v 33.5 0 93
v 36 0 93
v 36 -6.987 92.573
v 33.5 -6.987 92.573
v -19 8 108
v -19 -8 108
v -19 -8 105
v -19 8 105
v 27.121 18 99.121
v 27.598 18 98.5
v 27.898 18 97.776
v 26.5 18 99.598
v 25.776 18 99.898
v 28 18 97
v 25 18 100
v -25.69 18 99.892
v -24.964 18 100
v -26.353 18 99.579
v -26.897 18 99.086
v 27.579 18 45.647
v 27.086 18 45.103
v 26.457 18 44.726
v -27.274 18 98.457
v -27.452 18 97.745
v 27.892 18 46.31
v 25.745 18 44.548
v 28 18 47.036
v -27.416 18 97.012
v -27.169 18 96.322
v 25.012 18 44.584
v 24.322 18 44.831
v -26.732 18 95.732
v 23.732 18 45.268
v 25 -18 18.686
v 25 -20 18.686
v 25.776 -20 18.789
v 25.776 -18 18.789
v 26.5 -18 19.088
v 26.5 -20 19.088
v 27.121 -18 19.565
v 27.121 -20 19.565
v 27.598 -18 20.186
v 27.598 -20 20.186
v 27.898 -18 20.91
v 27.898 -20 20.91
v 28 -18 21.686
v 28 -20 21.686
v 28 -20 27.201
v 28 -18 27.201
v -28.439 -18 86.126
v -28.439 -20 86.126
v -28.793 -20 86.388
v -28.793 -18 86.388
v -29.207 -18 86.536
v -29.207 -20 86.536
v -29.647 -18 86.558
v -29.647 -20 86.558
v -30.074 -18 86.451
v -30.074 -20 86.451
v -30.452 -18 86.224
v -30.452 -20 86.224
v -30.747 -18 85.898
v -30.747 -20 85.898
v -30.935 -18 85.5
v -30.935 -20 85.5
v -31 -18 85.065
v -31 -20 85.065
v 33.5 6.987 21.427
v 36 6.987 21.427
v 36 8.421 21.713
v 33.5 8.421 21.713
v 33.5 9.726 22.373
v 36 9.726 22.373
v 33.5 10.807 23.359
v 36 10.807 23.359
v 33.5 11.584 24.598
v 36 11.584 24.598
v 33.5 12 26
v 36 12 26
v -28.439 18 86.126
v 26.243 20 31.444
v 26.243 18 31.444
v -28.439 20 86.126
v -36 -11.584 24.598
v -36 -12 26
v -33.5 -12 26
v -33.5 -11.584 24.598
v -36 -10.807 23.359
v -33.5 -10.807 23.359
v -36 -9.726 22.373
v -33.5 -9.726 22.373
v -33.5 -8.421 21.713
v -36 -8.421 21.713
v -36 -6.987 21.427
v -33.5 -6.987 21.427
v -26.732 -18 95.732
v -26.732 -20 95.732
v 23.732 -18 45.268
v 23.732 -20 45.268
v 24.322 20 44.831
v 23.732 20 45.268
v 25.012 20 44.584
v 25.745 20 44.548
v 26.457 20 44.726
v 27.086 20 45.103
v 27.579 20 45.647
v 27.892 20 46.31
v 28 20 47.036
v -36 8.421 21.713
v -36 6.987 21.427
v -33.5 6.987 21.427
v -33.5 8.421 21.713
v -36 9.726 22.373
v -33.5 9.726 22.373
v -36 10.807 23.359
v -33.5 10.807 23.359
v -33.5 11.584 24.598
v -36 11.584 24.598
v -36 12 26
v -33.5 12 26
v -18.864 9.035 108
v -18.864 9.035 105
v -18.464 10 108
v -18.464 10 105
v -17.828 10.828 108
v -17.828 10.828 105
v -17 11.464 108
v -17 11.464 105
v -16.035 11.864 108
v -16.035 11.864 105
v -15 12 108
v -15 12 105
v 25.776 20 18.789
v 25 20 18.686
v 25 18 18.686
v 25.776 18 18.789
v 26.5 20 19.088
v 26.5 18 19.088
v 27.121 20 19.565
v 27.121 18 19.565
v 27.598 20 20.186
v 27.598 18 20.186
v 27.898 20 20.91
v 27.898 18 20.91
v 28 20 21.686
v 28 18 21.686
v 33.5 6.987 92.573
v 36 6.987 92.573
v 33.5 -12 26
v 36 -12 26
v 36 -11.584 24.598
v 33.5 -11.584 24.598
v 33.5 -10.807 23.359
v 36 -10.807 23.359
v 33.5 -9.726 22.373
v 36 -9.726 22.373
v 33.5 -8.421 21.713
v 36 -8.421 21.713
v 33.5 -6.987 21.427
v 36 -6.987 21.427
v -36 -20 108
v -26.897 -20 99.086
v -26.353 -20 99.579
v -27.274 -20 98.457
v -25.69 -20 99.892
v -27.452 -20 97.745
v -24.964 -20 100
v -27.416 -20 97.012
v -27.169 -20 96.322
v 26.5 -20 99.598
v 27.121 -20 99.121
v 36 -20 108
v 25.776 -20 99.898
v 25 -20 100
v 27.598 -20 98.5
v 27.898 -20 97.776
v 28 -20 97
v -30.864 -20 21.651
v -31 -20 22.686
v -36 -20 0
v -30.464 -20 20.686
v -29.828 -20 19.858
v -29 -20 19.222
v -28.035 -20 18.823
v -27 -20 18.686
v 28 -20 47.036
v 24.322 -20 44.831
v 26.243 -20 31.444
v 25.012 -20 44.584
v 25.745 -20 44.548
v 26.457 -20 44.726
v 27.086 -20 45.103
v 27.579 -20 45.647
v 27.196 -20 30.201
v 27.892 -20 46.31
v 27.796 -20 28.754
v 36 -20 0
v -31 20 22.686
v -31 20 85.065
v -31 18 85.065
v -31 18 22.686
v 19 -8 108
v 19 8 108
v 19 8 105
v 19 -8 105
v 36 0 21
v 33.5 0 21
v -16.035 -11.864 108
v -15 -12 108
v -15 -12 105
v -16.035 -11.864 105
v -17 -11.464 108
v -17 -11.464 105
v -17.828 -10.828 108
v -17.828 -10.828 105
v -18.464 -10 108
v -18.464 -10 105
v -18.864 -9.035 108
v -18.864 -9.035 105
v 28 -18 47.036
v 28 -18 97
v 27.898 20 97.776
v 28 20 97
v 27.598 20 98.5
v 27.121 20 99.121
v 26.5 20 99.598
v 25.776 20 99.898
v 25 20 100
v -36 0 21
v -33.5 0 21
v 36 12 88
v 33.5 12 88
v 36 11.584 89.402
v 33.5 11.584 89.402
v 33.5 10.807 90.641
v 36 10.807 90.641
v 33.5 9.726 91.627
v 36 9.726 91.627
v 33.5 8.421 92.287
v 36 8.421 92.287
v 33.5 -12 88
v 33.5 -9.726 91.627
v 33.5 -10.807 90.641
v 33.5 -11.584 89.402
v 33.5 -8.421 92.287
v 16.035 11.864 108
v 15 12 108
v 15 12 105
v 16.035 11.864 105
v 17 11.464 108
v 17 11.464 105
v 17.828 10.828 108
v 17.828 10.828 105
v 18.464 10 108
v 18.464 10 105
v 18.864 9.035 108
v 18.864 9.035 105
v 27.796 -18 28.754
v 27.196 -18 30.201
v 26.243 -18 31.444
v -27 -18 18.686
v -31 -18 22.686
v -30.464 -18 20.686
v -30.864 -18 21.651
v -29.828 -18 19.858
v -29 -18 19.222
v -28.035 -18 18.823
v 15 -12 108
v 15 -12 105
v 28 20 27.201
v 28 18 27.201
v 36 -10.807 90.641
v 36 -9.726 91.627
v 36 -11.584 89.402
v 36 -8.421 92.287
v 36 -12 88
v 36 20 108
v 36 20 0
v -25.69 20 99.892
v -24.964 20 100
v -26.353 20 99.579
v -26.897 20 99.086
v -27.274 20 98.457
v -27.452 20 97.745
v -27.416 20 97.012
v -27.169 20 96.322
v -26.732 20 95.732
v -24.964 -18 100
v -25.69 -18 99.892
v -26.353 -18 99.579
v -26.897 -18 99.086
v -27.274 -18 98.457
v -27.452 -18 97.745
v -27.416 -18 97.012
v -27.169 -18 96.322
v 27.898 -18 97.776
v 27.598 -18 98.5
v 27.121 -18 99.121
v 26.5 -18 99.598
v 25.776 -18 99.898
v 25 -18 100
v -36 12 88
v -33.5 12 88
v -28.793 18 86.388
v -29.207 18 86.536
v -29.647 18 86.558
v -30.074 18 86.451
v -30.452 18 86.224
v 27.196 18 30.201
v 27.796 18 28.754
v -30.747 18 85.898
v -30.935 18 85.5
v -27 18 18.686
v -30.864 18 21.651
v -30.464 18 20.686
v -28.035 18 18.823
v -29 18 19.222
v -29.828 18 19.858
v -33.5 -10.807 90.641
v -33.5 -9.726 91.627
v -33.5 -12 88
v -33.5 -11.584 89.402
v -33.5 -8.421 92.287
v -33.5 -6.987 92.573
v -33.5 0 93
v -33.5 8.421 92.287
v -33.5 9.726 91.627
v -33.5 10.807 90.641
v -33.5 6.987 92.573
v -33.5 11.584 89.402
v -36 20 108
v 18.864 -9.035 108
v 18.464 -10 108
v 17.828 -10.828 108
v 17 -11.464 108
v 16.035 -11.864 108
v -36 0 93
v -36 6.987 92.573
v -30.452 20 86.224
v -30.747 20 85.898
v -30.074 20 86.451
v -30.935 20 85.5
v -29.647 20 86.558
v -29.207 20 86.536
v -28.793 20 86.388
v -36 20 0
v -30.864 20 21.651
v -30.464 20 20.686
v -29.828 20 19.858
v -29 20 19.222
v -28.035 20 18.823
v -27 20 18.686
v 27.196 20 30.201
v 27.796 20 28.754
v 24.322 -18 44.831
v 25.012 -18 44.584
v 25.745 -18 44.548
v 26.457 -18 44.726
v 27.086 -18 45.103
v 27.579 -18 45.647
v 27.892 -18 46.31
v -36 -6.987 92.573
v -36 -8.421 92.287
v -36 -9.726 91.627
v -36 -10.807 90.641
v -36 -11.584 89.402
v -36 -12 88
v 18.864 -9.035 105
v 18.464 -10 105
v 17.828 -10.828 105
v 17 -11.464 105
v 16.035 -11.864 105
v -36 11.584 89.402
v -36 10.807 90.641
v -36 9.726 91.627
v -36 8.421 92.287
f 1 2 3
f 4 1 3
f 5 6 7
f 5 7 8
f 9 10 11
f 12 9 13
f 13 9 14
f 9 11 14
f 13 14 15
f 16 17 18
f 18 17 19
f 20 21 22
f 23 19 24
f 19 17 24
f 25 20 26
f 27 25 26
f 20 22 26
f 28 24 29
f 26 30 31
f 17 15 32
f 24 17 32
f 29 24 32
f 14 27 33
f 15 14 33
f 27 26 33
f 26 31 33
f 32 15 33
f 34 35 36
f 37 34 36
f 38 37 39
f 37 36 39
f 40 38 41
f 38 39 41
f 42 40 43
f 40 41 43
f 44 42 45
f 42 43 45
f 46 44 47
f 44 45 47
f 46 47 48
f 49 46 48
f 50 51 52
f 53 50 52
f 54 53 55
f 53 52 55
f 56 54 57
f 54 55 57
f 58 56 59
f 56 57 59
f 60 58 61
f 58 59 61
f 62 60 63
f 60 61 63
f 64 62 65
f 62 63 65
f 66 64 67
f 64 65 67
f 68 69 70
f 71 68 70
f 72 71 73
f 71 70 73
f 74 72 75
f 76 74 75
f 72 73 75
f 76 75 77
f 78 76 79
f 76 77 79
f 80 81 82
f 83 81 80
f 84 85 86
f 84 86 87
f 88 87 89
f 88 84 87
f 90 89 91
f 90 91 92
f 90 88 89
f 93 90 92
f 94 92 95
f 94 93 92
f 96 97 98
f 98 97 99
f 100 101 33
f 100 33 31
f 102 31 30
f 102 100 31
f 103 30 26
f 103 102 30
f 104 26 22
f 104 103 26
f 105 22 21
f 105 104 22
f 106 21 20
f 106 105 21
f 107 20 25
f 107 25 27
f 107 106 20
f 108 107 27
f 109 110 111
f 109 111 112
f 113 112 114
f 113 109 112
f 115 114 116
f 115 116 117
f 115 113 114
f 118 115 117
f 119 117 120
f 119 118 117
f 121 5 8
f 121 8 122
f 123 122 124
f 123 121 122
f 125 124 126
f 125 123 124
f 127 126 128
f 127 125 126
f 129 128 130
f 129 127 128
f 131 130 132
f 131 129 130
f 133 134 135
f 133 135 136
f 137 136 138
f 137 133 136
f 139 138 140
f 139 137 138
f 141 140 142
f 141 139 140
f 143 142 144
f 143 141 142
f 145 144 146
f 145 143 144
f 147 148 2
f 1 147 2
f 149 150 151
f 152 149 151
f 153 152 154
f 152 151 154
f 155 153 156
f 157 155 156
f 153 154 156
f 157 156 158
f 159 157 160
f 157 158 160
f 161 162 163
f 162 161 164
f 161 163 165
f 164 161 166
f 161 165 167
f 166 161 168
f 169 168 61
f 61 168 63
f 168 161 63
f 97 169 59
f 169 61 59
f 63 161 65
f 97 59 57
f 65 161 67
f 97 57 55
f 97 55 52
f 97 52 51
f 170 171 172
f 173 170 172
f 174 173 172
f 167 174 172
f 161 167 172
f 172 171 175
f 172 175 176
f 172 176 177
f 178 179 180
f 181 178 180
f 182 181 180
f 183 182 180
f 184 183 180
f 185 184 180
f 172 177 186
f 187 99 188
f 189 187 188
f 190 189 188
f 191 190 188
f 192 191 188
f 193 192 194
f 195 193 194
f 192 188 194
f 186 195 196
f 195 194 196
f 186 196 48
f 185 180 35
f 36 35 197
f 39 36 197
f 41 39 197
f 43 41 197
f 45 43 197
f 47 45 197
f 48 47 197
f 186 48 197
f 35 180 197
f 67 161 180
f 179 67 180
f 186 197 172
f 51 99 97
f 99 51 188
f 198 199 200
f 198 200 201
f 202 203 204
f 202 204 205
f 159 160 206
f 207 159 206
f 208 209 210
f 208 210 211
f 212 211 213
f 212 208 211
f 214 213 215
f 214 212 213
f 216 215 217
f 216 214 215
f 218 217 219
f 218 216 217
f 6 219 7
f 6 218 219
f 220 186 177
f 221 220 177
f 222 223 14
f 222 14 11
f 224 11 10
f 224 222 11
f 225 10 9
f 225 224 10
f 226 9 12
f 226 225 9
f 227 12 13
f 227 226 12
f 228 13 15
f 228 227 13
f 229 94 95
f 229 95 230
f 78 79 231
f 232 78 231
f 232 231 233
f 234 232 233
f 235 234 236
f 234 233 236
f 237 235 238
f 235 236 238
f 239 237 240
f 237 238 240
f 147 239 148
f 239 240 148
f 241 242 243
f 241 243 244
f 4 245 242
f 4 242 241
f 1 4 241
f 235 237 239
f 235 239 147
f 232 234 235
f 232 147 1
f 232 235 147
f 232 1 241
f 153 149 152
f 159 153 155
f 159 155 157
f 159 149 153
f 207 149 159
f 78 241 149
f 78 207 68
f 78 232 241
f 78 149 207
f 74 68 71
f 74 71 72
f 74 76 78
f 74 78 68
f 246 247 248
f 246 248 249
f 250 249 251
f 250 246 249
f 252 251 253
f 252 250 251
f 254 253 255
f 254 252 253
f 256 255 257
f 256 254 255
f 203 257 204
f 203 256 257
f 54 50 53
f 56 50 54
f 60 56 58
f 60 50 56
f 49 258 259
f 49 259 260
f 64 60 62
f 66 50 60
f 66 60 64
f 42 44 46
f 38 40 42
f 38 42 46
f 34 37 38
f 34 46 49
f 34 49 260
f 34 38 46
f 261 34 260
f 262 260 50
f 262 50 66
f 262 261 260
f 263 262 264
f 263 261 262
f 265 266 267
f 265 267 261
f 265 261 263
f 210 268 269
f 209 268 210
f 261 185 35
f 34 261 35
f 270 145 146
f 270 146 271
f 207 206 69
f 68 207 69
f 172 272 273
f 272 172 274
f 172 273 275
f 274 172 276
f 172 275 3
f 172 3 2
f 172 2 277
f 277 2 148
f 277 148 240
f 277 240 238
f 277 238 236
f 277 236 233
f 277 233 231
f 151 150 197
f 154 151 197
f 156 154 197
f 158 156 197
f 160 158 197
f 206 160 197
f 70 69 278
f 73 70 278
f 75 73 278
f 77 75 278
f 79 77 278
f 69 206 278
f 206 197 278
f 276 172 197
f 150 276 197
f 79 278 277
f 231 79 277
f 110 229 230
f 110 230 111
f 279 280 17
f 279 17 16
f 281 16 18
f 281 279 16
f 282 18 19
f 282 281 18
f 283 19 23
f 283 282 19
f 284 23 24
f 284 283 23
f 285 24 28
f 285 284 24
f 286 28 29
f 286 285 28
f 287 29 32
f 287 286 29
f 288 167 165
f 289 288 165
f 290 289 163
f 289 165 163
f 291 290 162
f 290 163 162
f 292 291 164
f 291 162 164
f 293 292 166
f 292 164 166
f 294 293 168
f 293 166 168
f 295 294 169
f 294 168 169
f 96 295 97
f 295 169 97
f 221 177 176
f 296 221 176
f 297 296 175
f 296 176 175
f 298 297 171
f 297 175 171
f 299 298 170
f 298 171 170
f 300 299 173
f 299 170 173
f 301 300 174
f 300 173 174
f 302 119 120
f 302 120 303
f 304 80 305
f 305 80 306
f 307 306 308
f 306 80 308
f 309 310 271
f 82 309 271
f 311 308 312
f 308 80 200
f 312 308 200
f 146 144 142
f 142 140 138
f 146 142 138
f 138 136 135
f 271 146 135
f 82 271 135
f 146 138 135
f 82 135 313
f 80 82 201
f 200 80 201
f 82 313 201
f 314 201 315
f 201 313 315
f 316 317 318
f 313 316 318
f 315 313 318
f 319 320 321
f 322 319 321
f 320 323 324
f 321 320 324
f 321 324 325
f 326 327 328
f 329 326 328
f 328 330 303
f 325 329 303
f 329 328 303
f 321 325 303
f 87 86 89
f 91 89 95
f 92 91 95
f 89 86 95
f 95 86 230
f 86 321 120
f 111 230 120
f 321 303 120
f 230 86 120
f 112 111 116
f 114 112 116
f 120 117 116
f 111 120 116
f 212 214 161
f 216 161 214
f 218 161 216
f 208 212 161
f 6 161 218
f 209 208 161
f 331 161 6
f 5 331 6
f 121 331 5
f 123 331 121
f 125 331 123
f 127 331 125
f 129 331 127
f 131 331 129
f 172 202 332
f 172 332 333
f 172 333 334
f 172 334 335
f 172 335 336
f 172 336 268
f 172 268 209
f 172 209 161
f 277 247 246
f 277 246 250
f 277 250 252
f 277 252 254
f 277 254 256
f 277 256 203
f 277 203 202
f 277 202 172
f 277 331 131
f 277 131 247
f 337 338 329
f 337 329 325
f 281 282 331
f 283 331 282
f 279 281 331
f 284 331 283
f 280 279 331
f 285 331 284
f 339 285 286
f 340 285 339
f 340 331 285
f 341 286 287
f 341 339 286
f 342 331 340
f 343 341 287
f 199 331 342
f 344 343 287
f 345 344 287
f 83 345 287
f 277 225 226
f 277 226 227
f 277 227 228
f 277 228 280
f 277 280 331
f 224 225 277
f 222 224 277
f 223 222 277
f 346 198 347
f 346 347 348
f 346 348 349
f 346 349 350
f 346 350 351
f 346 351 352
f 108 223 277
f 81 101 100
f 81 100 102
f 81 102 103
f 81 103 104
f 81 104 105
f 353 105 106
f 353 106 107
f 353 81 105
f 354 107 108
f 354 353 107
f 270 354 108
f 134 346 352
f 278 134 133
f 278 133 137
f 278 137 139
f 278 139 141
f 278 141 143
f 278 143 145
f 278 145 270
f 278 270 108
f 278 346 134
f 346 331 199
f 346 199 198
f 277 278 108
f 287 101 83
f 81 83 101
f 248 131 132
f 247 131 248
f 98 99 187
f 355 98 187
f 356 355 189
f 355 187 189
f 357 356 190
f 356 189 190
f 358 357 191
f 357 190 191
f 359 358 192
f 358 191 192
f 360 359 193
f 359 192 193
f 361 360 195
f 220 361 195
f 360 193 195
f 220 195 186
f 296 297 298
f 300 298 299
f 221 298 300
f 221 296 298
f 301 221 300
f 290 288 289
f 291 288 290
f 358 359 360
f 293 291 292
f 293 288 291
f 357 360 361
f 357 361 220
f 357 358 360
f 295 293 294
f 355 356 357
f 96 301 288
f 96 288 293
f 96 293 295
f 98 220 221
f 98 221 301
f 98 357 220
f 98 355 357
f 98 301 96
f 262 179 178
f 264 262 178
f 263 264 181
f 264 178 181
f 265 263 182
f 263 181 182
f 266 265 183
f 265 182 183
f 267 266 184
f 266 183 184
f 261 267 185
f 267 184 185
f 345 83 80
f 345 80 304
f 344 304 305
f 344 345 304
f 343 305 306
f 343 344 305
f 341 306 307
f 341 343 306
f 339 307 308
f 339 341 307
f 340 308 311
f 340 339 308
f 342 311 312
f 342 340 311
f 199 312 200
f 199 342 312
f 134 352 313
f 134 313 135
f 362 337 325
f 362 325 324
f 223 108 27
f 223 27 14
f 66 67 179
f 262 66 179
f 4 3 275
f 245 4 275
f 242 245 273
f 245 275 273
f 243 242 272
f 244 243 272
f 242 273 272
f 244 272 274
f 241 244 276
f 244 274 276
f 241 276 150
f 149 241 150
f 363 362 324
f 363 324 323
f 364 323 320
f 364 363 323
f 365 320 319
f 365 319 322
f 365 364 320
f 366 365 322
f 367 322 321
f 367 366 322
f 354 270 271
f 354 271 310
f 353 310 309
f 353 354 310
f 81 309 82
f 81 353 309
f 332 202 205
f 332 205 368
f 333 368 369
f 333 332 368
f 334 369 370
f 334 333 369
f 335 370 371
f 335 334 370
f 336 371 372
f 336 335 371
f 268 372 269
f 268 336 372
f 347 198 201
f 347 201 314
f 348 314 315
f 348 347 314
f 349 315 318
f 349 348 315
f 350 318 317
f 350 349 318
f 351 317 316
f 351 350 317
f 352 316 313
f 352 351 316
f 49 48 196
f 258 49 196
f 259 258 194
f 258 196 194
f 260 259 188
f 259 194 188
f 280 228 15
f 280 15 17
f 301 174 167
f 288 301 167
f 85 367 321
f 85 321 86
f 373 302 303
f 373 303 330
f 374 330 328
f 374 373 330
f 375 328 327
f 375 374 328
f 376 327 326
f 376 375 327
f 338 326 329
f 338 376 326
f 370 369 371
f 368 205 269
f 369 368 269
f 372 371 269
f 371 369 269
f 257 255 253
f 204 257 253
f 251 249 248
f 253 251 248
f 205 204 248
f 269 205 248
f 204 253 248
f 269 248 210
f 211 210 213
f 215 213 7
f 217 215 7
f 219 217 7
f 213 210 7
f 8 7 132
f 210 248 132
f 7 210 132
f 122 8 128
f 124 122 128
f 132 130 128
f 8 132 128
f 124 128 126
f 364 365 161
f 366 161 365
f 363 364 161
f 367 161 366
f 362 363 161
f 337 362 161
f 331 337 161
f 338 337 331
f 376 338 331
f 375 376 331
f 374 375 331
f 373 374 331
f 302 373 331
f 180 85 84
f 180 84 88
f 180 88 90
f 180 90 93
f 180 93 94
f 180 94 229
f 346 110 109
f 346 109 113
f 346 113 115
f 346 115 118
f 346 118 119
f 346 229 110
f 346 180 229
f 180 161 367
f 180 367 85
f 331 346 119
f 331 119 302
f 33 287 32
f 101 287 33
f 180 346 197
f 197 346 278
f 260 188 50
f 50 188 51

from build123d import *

# Parameters (mm, degrees)
SKETCH_1_W          = 72
SKETCH_1_H          = 40
EXTRUDE_1_DEPTH     = 108
SKETCH_1_2_W        = 72
SKETCH_1_2_H        = 40
EXTRUDE_2_DEPTH     = 105
CUT_EXTRUDE_1_DEPTH = 2.5
CUT_EXTRUDE_2_DEPTH = 2
CUT_EXTRUDE_3_DEPTH = 3


with BuildPart() as part:
    # 草图1 → 凸台-拉伸1 (new body)
    with BuildSketch(Plane.XY):
        Rectangle(SKETCH_1_W, SKETCH_1_H)
    extrude(amount=EXTRUDE_1_DEPTH)

    # 草图1<2> → 凸台-拉伸2 (add)
    with BuildSketch(Plane.XY):
        Rectangle(SKETCH_1_2_W, SKETCH_1_2_H)
    extrude(amount=EXTRUDE_2_DEPTH)

    # 草图2 → 切除-拉伸1 (cut)
    with BuildSketch(Plane.ZY.offset(36)):
        with BuildLine():
            Line((26, 12), (88, 12))
            ThreePointArc((88, 12), (91.170727435, 10.300174957), (92.572660223, 6.986943589))
            Line((92.572660223, 6.986943589), (93, 0))
            Line((93, 0), (92.572660223, -6.986943589))
            ThreePointArc((92.572660223, -6.986943589), (91.170727435, -10.300174957), (88, -12))
            Line((88, -12), (26, -12))
            ThreePointArc((26, -12), (22.829272565, -10.300174957), (21.427339777, -6.986943589))
            Line((21.427339777, -6.986943589), (21, 0))
            Line((21, 0), (21.427339777, 6.986943589))
            ThreePointArc((21.427339777, 6.986943589), (22.829272565, 10.300174957), (26, 12))
        make_face()
    cut_extrude_1 = extrude(amount=-CUT_EXTRUDE_1_DEPTH, mode=Mode.SUBTRACT)

    # 草图3 → 切除-拉伸2 (cut)
    with BuildSketch(Plane(origin=(0, 20, 0), x_dir=(1, 0, 0), z_dir=(0, 1, 0))):
        with BuildLine():
            Line((25, -100), (-24.964466094, -100))
            ThreePointArc((-24.964466094, -100), (-27.274164925, -98.456708581), (-26.732233047, -95.732233047))
            Line((-26.732233047, -95.732233047), (23.732233047, -45.267766953))
            ThreePointArc((23.732233047, -45.267766953), (26.456708581, -44.725835075), (28, -47.035533906))
            Line((28, -47.035533906), (28, -97))
            ThreePointArc((28, -97), (27.121320344, -99.121320344), (25, -100))
        make_face()
        with BuildLine():
            Line((-31, -85.064971157), (-31, -22.686291501))
            ThreePointArc((-31, -22.686291501), (-29.828427125, -19.857864376), (-27, -18.686291501))
            Line((-27, -18.686291501), (25, -18.686291501))
            ThreePointArc((25, -18.686291501), (27.121320344, -19.564971157), (28, -21.686291501))
            Line((28, -21.686291501), (28, -27.201010127))
            ThreePointArc((28, -27.201010127), (27.543277195, -29.497110721), (26.242640687, -31.443650814))
            Line((26.242640687, -31.443650814), (-28.439339828, -86.125631329))
            ThreePointArc((-28.439339828, -86.125631329), (-30.074025149, -86.450790456), (-31, -85.064971157))
        make_face()
    cut_extrude_2 = extrude(amount=-CUT_EXTRUDE_2_DEPTH, mode=Mode.SUBTRACT)

    # 镜向1: 切除-拉伸2 across plane
    add(cut_extrude_2.mirror(Plane.ZX), mode=Mode.SUBTRACT)

    # 镜向2: 切除-拉伸1 across plane
    add(cut_extrude_1.mirror(Plane.ZY), mode=Mode.SUBTRACT)

    # 草图5 → 切除-拉伸3 (cut)
    with BuildSketch(Plane.XY.offset(108)):
        with BuildLine():
            Line((15, -12), (-15, -12))
            ThreePointArc((-15, -12), (-17.828427125, -10.828427125), (-19, -8))
            Line((-19, -8), (-19, 8))
            ThreePointArc((-19, 8), (-17.828427125, 10.828427125), (-15, 12))
            Line((-15, 12), (15, 12))
            ThreePointArc((15, 12), (17.828427125, 10.828427125), (19, 8))
            Line((19, 8), (19, -8))
            ThreePointArc((19, -8), (17.828427125, -10.828427125), (15, -12))
        make_face()
    extrude(amount=-CUT_EXTRUDE_3_DEPTH, mode=Mode.SUBTRACT)


solid = part.part
